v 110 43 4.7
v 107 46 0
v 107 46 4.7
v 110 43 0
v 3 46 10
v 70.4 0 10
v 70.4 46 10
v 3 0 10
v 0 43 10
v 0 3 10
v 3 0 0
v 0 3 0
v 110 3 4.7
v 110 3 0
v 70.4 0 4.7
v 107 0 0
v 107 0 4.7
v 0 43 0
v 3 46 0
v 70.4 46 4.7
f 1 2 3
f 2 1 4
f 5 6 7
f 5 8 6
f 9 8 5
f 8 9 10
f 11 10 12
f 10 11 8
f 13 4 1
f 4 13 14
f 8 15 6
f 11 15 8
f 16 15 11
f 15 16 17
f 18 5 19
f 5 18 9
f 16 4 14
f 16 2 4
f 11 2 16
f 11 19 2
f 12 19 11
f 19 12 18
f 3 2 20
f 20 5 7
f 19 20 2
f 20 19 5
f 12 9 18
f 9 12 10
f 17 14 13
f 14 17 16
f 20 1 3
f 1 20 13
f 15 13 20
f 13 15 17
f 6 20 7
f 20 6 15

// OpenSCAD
$fn = 32;

// ----------------------------------------------------------------------
// Stepped bar: endstep, 110 x 46 x 10/4.7 mm
// ----------------------------------------------------------------------

// --- parameters (mm) ---
bar_l = 110;              // bar length, X
bar_w = 46;               // bar width, Y
plate_t = 10;             // thickness of the thick zone, Z
thin_t = 4.7;             // thickness of the thin zone
corner_c = 3;             // corner chamfer of the bar
step_cut = 5.3;           // material removed from the thin zone
step_x = 70.4;            // step position from the left end
depth_1 = 5.3;            // depth of cut 1 from the top face

profile = [[3, 0], [107, 0], [110, 3], [110, 43], [107, 46], [3, 46], [0, 43], [0, 3]];  // primary outline, 8 points, counter clockwise
void_1 = [[70.4, -1], [111, -1], [111, 47], [70.4, 47]];  // thin zone beyond the step, 4 points

// --- the one profile operation ---
difference() {
  linear_extrude(height = plate_t) polygon(points = profile);
  translate([0, 0, plate_t - depth_1])
    linear_extrude(height = depth_1 + 1) polygon(points = void_1);
}
